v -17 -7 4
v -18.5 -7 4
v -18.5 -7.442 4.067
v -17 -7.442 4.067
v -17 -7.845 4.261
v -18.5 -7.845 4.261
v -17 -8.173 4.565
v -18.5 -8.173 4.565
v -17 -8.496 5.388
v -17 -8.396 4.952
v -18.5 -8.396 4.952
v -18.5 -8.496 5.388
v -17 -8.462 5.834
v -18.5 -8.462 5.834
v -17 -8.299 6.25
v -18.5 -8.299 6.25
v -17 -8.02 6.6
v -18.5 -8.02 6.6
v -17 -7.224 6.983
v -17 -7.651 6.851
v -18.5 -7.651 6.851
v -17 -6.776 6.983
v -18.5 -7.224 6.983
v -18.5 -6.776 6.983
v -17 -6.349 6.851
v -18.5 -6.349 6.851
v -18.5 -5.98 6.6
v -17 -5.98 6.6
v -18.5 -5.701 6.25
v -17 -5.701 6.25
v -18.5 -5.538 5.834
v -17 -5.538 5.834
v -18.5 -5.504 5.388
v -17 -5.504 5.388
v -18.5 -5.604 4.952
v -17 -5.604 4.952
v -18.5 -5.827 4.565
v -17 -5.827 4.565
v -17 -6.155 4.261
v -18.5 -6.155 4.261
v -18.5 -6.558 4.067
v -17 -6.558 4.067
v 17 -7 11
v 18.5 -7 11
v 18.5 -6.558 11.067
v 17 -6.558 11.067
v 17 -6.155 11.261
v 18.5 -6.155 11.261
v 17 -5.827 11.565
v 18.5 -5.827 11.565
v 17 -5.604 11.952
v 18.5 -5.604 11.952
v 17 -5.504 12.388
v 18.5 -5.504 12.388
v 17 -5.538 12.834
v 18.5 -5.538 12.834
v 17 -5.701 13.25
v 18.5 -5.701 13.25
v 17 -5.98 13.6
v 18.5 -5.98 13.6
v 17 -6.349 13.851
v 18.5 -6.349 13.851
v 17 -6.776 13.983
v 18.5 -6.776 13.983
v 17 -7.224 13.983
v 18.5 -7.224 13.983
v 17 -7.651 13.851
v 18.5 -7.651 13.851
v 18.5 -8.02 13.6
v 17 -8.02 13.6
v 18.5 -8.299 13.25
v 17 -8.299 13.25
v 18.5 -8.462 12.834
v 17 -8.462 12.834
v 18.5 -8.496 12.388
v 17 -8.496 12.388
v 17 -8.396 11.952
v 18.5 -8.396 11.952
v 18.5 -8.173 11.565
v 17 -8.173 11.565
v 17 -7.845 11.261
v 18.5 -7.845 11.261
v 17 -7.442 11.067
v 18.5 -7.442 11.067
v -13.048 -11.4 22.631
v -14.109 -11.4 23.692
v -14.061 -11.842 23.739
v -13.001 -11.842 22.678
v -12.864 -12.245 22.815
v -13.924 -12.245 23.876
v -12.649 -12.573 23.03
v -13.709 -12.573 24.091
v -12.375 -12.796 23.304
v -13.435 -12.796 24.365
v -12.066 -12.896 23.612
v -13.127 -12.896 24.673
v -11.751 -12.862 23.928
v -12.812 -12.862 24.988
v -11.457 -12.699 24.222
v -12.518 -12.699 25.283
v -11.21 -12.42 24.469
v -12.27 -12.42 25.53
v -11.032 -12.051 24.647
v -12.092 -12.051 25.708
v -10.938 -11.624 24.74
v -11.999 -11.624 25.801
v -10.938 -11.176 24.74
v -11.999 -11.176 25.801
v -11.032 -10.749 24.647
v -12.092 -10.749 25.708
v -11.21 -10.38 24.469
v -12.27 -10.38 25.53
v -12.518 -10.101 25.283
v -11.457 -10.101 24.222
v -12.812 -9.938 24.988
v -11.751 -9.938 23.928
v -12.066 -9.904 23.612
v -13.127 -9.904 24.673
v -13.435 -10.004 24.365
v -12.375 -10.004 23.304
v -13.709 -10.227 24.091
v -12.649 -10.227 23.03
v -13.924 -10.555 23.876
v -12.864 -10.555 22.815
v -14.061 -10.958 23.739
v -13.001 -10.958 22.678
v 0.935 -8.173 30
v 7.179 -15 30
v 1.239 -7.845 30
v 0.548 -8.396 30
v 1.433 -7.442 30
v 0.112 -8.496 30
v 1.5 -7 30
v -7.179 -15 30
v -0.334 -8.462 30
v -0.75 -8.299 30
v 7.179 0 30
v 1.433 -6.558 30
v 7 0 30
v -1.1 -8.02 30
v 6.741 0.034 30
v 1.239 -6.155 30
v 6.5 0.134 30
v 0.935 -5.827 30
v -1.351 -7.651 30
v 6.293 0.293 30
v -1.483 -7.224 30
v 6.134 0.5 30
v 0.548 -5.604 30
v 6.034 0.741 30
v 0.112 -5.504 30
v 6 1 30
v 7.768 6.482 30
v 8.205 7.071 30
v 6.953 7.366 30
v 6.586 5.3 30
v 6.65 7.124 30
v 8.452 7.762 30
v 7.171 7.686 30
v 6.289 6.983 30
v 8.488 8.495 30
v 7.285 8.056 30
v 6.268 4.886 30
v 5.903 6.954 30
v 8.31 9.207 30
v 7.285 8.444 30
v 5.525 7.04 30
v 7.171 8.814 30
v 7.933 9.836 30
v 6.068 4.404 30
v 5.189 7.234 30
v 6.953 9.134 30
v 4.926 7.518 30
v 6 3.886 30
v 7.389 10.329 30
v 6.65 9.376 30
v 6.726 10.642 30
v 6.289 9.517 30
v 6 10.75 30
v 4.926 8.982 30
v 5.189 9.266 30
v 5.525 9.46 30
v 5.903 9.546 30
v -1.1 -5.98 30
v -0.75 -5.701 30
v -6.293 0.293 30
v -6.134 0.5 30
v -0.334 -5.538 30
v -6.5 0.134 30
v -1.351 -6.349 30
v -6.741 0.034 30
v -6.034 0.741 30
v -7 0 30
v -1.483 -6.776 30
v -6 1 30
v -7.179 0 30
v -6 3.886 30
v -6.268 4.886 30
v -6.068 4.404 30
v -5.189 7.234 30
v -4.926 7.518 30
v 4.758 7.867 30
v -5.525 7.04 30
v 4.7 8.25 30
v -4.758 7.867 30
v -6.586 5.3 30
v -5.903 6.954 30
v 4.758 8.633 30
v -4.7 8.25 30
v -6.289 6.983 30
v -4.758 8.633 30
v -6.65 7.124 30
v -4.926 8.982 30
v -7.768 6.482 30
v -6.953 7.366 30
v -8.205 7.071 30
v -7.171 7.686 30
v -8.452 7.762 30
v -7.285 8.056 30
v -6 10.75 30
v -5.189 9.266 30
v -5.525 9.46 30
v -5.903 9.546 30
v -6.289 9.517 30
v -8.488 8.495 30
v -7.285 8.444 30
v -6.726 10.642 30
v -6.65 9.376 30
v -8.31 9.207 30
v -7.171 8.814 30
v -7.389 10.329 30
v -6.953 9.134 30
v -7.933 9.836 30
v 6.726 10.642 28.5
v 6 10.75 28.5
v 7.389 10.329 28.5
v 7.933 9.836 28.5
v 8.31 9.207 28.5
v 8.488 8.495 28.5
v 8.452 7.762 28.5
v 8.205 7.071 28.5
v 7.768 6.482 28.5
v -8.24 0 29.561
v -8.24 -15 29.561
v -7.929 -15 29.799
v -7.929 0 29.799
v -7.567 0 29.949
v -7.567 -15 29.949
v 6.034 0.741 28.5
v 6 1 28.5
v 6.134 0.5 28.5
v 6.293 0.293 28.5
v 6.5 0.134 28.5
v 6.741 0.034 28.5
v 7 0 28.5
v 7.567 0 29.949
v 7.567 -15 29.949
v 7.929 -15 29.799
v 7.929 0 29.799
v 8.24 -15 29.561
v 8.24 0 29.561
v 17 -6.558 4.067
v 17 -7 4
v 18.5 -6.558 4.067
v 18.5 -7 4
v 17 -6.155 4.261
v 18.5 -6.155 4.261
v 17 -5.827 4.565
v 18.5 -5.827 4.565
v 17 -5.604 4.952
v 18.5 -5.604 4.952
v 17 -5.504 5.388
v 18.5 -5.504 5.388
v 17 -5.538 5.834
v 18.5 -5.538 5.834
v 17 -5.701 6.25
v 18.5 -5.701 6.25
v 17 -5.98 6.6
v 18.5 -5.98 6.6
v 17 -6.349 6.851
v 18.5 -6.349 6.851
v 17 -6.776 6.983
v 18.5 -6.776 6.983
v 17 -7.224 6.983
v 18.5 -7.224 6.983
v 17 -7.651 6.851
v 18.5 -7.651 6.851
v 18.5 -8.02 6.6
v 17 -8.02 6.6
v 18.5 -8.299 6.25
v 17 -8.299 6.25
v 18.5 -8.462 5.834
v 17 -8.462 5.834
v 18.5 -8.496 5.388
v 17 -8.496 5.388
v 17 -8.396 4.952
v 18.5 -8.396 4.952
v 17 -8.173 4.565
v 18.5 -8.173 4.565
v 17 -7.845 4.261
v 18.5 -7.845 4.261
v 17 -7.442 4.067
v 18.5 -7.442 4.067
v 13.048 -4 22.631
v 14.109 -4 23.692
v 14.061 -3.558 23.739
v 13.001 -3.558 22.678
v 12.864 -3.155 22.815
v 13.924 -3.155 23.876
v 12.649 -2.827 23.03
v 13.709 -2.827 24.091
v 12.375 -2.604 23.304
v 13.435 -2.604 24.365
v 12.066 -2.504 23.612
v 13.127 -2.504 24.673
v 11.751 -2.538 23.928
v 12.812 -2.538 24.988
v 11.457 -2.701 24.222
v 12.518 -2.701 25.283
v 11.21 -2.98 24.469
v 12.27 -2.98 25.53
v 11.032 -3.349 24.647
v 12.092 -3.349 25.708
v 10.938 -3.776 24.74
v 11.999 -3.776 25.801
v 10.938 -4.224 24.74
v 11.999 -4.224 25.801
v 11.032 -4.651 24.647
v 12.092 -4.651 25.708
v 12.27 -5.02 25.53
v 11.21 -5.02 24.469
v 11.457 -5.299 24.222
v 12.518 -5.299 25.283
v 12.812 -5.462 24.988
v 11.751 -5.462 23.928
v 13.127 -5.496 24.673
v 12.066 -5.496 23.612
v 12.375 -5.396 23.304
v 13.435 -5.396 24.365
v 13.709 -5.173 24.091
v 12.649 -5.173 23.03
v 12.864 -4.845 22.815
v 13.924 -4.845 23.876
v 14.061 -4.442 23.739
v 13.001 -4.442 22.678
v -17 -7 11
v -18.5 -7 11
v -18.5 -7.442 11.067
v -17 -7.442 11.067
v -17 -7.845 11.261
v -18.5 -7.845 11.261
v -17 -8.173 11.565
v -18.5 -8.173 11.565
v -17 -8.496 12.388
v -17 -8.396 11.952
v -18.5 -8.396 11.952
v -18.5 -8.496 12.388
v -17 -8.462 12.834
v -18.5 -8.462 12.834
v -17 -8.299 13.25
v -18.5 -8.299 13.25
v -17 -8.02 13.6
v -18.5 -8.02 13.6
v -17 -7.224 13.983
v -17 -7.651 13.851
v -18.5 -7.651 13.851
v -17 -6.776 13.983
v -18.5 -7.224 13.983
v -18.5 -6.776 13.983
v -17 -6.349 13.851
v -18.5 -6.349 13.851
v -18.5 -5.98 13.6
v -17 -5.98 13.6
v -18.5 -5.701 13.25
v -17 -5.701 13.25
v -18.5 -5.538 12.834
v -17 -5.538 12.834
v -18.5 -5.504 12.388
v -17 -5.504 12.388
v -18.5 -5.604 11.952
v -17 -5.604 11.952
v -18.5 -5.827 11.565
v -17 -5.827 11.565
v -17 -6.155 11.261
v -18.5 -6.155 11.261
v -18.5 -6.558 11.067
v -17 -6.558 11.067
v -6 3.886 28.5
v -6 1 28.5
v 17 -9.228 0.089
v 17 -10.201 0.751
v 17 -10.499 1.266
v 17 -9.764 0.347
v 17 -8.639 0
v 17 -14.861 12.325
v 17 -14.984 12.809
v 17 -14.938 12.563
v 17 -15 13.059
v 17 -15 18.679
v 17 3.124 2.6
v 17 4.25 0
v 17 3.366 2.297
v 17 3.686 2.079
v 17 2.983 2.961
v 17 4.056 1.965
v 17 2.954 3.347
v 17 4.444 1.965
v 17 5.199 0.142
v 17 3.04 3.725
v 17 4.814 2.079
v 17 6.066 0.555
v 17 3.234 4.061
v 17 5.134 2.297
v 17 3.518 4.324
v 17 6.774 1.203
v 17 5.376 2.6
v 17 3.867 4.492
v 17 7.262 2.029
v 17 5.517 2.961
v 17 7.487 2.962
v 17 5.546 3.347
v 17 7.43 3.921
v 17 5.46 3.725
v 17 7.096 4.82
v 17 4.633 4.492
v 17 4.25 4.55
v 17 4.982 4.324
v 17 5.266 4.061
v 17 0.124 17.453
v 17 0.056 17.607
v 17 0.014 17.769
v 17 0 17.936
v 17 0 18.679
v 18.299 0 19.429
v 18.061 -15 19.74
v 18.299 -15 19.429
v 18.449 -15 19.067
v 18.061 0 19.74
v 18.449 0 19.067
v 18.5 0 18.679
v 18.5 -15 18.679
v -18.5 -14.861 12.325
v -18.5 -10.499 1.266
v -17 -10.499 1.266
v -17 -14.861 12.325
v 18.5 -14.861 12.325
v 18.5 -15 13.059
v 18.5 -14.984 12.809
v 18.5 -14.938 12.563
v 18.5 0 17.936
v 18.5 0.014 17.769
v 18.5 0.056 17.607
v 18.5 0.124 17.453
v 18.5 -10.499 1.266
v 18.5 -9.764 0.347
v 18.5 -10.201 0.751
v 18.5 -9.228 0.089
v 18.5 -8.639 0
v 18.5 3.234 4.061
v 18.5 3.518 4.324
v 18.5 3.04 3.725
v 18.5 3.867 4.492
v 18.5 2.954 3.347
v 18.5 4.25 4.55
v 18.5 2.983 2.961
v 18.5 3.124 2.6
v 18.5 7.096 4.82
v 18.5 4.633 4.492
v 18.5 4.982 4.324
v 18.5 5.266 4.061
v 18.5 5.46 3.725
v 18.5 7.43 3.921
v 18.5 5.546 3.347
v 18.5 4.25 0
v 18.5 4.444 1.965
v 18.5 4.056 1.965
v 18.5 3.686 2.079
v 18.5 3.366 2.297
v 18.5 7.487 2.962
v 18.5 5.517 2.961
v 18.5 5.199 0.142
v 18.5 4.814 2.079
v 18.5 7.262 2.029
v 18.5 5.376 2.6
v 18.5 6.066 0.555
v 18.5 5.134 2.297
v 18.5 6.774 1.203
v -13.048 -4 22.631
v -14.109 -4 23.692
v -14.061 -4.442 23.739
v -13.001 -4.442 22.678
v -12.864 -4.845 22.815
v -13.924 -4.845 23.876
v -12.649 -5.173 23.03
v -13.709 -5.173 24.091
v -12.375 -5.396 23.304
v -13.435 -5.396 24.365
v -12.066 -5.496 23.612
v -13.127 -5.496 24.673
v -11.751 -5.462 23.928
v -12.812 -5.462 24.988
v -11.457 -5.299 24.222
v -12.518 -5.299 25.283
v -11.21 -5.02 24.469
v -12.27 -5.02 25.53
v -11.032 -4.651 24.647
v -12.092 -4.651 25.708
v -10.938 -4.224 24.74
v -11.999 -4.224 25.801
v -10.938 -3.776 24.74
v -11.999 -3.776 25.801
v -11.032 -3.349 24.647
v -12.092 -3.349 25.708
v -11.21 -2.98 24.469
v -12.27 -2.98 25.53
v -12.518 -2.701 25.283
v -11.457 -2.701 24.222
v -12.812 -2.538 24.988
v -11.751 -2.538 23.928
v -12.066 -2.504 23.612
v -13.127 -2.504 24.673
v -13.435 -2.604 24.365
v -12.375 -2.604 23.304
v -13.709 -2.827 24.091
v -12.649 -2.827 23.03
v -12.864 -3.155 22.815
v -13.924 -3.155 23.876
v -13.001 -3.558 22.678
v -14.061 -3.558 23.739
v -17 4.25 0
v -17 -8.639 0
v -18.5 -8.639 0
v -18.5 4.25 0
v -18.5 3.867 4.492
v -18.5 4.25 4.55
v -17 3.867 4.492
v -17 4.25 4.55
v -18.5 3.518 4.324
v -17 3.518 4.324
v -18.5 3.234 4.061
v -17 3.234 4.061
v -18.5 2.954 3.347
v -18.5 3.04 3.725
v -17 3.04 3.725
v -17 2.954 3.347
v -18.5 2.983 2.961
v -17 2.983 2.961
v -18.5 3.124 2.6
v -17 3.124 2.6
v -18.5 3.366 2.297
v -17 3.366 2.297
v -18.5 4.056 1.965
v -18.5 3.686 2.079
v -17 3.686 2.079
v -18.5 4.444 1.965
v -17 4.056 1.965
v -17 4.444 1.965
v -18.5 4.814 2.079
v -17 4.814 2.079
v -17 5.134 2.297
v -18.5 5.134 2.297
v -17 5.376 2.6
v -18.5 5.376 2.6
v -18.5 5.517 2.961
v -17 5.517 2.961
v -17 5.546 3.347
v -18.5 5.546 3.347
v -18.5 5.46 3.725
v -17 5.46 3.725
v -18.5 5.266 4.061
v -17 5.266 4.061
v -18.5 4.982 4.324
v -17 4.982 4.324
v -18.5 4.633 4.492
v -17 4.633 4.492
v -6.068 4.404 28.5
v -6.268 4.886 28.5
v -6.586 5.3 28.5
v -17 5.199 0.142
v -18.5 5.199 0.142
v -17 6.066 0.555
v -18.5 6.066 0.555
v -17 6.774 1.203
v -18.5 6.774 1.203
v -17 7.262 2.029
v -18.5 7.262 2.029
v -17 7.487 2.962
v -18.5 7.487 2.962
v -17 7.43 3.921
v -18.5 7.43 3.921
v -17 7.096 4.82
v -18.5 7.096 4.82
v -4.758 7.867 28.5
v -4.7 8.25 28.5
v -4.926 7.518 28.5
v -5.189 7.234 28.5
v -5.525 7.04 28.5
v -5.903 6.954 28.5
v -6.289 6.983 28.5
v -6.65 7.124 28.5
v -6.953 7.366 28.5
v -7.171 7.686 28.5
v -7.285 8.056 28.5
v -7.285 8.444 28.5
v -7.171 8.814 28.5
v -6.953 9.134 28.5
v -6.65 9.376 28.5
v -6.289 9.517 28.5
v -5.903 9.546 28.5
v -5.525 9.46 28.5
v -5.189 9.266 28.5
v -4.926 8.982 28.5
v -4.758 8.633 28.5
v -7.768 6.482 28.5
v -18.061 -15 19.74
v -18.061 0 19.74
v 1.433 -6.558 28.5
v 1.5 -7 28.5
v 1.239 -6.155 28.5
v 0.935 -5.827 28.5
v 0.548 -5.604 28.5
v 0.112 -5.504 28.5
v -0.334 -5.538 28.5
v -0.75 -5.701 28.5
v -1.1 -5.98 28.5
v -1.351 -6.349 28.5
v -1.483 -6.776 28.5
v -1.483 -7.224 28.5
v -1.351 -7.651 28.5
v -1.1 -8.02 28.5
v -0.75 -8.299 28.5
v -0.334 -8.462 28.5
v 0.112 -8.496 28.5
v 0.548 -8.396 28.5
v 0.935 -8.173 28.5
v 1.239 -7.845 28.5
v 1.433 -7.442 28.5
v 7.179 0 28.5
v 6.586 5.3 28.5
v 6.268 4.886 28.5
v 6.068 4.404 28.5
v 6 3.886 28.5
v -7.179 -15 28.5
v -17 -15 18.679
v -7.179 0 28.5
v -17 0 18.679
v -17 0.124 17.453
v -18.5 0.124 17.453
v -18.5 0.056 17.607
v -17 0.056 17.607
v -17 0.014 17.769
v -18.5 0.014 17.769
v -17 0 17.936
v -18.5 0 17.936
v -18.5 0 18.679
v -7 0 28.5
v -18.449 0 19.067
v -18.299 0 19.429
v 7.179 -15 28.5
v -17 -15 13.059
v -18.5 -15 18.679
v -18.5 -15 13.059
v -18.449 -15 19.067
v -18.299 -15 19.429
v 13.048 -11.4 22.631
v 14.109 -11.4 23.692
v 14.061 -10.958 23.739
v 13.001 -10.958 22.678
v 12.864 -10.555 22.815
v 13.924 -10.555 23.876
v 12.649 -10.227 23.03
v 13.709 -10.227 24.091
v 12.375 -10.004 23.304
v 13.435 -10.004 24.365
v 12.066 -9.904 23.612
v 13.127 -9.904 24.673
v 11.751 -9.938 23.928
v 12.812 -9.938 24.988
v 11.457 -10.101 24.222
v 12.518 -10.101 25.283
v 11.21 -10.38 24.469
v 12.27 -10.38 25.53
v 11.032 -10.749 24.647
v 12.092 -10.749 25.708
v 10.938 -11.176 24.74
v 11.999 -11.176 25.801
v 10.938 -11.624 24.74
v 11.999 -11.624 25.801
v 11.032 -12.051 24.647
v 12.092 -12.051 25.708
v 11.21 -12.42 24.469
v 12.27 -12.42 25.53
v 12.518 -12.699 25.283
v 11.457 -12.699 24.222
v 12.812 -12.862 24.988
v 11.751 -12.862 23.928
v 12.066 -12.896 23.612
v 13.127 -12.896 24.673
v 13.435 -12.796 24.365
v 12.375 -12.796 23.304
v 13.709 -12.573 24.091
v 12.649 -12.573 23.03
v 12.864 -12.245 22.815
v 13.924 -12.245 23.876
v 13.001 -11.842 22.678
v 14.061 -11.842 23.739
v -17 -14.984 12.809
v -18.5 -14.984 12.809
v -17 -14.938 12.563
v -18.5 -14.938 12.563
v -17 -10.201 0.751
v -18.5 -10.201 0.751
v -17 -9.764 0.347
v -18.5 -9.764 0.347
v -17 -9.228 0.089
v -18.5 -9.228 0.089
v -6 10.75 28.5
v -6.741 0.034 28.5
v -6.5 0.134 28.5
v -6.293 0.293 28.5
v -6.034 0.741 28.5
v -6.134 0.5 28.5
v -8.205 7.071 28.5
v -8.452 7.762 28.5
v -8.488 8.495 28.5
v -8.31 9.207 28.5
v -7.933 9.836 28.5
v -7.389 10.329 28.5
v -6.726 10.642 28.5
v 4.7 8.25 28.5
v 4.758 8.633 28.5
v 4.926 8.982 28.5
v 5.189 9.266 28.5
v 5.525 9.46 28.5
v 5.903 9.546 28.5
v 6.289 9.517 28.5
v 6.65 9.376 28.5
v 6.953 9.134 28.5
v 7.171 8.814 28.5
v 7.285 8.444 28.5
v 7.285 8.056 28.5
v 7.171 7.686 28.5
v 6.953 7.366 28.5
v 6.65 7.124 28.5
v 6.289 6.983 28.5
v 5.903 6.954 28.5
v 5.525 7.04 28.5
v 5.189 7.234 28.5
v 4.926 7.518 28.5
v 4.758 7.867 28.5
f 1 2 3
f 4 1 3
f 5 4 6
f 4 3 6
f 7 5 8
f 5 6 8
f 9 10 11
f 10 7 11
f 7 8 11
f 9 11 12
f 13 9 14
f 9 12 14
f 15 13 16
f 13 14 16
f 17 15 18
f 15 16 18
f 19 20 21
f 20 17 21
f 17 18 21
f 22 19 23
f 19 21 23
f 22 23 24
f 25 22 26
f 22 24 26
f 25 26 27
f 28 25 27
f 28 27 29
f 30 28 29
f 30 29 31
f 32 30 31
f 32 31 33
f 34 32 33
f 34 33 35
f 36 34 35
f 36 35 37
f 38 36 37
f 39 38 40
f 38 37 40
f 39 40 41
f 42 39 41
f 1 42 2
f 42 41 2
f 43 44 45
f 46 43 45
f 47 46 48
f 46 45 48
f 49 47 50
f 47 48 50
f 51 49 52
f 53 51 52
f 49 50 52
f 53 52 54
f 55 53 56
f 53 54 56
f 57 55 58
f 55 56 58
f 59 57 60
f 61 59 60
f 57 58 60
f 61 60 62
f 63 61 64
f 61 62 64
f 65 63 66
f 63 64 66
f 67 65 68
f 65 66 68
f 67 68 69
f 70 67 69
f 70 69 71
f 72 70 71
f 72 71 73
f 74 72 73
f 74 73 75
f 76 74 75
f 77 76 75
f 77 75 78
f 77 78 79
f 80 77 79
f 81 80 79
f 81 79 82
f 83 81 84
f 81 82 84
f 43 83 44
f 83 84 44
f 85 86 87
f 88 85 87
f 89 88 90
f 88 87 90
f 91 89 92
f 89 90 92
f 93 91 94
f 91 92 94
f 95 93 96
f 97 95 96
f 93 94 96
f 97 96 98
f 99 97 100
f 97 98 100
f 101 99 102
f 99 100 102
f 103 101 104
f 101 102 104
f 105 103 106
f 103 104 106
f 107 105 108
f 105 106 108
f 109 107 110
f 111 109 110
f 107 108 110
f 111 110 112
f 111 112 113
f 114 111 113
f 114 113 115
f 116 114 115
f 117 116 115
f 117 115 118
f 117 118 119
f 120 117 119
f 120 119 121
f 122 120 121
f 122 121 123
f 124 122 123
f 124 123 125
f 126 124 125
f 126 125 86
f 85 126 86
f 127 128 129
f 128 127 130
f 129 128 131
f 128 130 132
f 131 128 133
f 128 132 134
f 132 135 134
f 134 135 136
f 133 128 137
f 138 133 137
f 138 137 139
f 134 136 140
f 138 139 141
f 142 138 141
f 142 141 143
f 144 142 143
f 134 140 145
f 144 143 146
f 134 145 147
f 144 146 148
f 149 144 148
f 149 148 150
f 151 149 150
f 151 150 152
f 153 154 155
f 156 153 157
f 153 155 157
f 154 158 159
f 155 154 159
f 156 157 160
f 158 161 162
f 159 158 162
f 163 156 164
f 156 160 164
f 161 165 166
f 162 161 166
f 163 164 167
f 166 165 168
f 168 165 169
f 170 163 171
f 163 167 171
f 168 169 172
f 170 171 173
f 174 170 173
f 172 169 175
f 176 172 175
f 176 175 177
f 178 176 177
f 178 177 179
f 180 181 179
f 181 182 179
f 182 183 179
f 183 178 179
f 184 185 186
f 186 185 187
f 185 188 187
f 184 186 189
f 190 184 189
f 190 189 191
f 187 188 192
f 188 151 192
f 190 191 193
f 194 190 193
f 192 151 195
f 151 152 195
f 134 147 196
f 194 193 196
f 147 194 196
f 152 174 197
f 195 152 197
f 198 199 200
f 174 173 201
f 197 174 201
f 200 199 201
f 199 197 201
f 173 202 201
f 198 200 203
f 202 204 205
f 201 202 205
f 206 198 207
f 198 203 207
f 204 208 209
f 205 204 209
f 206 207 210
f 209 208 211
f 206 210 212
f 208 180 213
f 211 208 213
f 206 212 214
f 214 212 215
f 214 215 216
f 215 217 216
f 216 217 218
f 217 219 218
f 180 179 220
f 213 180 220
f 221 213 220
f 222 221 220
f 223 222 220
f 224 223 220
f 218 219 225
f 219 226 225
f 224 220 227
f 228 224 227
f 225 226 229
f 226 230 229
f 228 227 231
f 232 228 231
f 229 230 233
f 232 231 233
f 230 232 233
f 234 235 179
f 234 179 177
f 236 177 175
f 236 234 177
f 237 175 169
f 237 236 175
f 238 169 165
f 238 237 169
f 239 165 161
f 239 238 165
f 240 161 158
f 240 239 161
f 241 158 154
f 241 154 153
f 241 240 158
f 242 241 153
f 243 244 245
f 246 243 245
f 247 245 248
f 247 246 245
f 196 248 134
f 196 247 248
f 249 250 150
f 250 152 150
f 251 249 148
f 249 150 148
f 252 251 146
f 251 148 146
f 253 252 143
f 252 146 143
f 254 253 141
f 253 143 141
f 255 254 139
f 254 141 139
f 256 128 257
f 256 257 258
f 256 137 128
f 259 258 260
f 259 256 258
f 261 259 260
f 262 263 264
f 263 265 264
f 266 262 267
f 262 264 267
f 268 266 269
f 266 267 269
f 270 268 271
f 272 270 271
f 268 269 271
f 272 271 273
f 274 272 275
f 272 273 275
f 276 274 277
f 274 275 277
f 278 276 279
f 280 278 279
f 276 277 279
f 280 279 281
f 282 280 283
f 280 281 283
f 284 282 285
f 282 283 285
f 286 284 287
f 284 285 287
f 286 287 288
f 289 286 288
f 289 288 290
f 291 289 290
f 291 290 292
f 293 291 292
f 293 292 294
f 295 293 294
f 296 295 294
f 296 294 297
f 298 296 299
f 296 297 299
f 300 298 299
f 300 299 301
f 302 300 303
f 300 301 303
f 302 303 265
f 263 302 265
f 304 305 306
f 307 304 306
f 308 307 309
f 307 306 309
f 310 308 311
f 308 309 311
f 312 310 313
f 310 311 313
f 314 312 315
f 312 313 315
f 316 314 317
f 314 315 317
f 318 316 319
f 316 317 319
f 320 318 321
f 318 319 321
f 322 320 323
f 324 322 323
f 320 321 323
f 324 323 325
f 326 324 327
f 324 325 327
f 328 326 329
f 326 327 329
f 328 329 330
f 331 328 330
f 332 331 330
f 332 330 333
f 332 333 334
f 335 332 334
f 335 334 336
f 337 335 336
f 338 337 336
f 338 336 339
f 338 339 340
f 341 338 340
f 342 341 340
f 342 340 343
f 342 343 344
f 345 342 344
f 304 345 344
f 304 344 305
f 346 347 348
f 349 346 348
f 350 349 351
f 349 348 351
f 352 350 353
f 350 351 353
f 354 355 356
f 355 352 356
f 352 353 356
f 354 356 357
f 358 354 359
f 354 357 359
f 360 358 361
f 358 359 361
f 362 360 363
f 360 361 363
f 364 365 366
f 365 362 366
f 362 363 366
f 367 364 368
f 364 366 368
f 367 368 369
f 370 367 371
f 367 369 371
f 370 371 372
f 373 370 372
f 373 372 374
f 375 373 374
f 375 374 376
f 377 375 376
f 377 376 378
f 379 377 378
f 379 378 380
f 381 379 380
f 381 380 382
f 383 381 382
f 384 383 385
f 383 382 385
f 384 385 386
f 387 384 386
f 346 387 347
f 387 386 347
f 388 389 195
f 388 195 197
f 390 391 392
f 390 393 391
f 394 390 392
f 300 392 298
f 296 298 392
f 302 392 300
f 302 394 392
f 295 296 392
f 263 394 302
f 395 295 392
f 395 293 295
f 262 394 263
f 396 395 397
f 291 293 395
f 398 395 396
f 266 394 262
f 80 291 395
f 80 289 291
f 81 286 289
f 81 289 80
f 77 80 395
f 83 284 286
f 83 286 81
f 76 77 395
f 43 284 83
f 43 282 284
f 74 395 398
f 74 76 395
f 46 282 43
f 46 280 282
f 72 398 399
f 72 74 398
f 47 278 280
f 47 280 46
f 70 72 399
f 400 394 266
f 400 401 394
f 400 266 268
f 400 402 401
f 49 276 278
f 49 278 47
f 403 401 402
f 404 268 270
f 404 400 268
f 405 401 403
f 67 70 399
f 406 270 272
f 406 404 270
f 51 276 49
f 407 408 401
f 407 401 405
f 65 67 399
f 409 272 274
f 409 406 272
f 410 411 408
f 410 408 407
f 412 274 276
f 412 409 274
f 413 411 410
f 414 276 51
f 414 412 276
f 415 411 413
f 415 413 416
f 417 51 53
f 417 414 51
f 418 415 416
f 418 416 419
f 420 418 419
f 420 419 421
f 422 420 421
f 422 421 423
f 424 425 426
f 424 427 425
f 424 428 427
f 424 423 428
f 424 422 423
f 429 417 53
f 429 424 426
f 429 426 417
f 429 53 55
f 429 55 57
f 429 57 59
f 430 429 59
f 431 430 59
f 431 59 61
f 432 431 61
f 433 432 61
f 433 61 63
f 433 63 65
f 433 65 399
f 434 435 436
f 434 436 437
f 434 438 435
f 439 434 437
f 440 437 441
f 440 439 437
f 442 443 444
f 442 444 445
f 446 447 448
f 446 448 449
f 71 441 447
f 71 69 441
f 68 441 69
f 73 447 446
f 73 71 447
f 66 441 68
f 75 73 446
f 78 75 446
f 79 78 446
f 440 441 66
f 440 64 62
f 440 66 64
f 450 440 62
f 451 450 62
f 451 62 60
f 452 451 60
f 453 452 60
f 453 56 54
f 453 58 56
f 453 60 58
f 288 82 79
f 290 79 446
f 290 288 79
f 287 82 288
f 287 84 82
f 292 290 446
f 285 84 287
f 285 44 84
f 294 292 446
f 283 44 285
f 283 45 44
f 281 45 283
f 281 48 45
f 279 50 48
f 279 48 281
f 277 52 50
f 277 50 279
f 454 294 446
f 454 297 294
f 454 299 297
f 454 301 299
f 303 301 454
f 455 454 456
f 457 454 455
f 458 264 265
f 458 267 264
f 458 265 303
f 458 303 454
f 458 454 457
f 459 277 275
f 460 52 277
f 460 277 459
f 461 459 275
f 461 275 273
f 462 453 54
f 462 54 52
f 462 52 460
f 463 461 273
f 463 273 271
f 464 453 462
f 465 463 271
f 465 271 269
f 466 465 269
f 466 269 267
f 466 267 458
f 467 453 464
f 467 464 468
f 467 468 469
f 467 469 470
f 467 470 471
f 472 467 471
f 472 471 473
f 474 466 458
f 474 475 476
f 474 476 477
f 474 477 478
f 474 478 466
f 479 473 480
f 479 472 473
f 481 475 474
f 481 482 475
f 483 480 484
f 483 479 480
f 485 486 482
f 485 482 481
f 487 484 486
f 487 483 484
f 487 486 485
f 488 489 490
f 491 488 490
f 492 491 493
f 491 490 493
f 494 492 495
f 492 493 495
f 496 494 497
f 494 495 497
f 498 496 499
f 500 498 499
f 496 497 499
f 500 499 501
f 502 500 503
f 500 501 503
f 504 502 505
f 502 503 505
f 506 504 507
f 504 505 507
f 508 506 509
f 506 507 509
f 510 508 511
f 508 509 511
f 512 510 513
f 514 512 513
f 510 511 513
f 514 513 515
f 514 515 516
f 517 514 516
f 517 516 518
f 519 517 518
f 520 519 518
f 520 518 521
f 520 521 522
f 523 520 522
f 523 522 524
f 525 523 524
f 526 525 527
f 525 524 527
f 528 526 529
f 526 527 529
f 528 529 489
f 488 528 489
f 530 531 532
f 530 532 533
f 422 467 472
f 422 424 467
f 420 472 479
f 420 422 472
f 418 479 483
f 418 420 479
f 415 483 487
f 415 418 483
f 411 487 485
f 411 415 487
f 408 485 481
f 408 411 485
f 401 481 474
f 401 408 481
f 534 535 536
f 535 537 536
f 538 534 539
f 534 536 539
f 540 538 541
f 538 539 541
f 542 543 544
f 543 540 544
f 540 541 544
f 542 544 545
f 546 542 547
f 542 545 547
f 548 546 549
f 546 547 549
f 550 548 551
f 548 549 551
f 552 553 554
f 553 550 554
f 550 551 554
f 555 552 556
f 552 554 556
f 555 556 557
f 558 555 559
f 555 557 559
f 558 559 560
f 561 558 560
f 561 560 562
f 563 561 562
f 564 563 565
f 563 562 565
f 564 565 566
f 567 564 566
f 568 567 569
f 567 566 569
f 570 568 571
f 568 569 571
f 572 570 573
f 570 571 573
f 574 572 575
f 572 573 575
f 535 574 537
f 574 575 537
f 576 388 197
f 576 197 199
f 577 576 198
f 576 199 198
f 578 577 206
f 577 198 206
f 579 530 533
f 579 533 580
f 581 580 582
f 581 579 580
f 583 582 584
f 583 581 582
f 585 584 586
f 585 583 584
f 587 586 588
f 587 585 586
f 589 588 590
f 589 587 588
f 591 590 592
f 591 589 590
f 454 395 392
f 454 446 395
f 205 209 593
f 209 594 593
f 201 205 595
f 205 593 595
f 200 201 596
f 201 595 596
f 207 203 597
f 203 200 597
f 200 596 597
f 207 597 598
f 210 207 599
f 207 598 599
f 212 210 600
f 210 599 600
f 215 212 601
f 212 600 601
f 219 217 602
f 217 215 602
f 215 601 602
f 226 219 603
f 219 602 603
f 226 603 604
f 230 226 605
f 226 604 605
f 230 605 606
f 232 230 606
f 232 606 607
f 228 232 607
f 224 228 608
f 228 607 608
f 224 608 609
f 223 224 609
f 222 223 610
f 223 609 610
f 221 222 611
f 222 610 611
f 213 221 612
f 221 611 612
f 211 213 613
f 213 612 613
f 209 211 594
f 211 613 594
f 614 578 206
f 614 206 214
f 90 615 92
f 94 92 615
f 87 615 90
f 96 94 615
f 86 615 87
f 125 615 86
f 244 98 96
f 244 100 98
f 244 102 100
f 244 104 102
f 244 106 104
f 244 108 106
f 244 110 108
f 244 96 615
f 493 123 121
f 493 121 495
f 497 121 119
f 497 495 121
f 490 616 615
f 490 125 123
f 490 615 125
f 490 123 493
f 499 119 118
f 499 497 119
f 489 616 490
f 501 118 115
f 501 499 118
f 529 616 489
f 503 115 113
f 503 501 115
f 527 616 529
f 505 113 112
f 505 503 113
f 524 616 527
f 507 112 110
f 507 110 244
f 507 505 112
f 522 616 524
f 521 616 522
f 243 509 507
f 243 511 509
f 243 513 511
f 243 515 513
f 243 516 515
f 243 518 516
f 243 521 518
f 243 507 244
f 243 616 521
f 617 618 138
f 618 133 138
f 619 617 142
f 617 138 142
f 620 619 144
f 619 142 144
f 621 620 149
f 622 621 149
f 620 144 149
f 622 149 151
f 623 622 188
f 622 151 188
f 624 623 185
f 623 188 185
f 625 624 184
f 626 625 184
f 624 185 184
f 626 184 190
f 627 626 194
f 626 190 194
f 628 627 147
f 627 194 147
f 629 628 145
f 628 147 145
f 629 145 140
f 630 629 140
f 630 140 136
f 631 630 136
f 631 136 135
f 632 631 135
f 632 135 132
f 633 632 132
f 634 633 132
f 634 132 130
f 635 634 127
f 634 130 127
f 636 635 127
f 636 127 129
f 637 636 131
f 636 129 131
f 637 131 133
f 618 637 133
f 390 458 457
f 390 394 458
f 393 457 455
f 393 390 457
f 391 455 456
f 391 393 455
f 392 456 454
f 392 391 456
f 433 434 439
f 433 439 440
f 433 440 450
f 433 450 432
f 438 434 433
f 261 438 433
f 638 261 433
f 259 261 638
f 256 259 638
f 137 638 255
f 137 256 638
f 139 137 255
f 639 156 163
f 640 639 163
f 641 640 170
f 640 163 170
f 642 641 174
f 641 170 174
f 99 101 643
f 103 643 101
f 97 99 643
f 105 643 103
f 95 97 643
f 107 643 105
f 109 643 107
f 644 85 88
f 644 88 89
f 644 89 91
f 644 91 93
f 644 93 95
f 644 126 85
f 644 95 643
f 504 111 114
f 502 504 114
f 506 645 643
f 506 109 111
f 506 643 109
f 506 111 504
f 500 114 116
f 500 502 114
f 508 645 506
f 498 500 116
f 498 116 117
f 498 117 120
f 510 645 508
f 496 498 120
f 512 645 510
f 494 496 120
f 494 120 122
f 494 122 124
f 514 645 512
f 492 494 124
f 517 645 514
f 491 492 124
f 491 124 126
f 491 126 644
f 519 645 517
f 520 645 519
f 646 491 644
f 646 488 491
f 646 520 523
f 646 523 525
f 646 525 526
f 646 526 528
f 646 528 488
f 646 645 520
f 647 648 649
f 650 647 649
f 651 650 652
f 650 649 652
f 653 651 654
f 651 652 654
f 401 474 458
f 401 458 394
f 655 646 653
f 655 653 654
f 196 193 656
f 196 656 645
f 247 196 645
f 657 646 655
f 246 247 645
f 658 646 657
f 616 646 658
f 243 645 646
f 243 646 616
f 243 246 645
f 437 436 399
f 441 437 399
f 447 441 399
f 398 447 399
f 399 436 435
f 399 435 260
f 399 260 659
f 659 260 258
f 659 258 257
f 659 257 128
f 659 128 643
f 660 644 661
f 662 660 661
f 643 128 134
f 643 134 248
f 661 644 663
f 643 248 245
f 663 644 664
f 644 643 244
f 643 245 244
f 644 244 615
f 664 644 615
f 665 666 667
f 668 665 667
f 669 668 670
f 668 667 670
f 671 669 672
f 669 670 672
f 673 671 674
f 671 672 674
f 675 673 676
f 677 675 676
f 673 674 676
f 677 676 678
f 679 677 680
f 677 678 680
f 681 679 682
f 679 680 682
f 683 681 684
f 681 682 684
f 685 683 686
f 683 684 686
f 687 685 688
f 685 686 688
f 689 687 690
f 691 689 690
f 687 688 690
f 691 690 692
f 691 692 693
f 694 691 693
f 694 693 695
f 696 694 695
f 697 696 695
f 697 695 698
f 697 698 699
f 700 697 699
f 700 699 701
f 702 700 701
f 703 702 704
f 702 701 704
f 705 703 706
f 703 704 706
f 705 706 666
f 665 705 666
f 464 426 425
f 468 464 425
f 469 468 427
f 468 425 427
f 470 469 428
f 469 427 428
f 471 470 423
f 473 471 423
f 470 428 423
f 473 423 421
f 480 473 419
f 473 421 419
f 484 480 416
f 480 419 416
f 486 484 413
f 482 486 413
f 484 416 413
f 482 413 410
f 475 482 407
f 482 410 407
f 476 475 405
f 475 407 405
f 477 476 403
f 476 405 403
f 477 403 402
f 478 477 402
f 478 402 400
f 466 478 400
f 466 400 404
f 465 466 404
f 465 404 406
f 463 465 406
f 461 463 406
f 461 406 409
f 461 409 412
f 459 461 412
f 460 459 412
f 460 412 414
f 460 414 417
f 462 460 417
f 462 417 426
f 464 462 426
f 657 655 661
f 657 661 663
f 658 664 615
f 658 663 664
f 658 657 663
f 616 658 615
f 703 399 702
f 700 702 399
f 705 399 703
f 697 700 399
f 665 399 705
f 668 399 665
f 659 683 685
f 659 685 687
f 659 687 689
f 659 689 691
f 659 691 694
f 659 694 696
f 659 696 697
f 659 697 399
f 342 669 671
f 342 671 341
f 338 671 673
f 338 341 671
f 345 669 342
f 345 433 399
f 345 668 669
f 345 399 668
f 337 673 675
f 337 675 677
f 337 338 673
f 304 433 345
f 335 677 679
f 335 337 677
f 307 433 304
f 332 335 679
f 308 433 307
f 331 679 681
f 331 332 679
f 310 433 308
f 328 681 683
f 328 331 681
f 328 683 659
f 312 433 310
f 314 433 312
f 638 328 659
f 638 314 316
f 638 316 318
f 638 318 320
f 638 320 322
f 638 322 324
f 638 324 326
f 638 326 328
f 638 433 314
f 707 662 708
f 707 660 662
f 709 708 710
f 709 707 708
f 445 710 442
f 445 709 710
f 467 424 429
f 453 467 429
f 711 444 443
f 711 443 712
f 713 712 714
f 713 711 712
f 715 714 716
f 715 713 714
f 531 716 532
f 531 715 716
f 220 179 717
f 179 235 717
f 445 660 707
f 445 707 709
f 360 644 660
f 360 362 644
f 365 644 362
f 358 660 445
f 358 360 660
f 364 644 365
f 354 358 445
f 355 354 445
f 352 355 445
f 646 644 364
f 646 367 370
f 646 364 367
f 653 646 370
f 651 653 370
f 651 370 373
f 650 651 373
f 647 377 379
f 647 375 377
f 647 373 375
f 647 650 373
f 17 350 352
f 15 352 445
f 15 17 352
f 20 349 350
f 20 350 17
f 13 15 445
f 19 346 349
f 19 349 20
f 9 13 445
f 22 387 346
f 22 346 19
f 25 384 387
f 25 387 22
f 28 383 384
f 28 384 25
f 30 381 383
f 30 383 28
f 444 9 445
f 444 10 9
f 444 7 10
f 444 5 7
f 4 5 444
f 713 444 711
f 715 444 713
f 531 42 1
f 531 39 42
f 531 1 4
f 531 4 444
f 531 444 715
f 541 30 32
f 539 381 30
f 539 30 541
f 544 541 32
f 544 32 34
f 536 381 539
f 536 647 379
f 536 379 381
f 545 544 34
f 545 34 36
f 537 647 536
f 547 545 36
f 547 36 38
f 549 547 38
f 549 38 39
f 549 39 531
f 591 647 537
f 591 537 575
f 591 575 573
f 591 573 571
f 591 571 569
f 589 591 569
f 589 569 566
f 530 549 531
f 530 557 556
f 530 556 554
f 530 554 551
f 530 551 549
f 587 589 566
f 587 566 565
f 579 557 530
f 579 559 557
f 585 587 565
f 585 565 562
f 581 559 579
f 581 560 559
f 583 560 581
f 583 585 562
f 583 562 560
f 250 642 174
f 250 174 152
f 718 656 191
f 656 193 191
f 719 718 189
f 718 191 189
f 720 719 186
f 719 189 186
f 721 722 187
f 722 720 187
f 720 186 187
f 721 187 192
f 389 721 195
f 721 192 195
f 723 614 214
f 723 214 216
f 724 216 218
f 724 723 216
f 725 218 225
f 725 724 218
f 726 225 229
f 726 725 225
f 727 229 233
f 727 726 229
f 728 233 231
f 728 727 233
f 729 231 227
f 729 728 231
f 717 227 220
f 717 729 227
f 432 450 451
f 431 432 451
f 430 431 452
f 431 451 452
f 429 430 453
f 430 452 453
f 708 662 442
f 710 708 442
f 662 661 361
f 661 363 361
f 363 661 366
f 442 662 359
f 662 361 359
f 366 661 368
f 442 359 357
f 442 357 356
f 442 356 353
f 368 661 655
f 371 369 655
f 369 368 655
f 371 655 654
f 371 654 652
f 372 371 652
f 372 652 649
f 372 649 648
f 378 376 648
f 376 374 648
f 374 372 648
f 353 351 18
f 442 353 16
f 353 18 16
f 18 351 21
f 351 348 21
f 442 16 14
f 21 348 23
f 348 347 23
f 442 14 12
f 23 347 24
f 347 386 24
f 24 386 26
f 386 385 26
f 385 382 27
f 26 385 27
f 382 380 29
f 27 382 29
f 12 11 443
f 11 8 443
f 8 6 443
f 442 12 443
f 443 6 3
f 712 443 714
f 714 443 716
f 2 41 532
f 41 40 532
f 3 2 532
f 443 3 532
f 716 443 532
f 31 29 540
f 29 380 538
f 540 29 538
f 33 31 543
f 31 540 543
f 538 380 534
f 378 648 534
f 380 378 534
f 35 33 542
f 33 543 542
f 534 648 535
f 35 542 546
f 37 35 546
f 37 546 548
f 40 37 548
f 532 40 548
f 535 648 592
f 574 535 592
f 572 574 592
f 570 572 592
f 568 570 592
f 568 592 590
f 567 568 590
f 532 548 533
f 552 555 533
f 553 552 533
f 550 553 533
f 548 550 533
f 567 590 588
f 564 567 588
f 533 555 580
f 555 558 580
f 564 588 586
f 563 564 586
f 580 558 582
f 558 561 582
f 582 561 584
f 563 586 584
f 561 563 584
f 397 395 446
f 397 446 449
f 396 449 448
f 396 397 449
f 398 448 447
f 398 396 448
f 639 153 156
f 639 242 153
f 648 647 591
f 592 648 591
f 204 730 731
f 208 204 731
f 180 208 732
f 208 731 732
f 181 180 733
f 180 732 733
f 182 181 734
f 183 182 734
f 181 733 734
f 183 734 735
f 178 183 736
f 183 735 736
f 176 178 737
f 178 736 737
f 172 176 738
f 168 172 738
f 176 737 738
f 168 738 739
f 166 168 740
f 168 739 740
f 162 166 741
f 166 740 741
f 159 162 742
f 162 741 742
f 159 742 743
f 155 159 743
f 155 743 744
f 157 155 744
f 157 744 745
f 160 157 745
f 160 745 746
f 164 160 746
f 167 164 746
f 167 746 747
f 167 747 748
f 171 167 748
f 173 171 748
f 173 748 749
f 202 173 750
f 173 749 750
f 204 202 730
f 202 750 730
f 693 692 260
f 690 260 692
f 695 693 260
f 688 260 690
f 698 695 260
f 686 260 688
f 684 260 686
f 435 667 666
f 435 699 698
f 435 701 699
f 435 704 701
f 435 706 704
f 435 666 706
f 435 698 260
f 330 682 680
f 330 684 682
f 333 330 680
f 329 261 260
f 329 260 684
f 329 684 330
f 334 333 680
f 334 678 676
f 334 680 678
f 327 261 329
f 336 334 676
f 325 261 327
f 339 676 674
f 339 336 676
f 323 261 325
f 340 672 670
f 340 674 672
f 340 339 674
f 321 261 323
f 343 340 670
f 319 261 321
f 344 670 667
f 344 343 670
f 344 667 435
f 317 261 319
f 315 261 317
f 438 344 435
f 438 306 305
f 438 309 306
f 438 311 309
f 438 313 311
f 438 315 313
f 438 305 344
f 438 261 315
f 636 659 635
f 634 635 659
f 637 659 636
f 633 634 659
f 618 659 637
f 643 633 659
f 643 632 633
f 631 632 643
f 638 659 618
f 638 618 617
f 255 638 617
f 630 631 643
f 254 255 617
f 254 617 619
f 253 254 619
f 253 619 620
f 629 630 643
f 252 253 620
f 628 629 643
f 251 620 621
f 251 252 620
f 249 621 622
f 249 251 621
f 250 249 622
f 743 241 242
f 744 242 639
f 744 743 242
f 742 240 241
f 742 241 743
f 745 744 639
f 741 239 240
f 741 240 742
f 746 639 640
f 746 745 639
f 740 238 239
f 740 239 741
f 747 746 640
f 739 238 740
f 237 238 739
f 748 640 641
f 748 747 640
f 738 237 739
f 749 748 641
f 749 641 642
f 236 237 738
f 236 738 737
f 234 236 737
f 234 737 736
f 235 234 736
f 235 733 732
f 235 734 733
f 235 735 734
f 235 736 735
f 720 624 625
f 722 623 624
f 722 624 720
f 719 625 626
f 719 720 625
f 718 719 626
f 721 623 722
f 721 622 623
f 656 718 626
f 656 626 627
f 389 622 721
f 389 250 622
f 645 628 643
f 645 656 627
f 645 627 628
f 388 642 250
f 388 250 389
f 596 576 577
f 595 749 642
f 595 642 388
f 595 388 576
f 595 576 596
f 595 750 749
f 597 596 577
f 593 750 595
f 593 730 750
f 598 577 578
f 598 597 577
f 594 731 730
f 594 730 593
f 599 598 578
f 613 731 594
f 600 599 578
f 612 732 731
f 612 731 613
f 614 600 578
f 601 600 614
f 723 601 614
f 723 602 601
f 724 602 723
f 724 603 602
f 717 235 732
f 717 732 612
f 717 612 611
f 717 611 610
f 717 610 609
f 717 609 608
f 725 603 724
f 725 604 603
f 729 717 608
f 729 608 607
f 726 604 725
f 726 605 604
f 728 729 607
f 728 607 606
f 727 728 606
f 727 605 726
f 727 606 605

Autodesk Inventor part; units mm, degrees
ref_plane "YZ Plane" through (0, 0, 0) normal (1, 0, 0) x (0, 1, 0)
ref_plane "XZ Plane" through (0, 0, 0) normal (0, 1, 0) x (-1, 0, 0)
ref_plane "XY Plane" through (0, 0, 0) normal (0, 0, 1) x (1, 0, 0)
sketch "スケッチ1" plane through (0, 0, 0) normal (0, 1, 0) x (-1, 0, 0)
  line L0 (0, 0) -> (0, 28.5) construction
  line L1 (0, 30) -> (-7.1789, 30)
  line L2 (-8.2396, 29.5607) -> (-18.0607, 19.7396)
  line L3 (-18.5, 18.6789) -> (-18.5, 0)
  line L4 (-18.5, 0) -> (-17, 0)
  line L5 (-17, 0) -> (-17, 18.6789)
  line L6 (-17, 18.6789) -> (-7.1789, 28.5)
  line L7 (-7.1789, 28.5) -> (0, 28.5)
  line L8 (0, 28.5) -> (0, 30)
  line L9 (0, 0) -> (-17, 0) construction
  line L10 (0, 14.25) -> (-10.7145, 24.9645) construction
  arc A0 (-7.1789, 30) -> (-8.2396, 29.5607) centre (-7.1789, 28.5) ccw
  arc A1 (-18.0607, 19.7396) -> (-18.5, 18.6789) centre (-17, 18.6789) ccw
  dimension "d0" = 28.5
  dimension "d1" = 1.5
  dimension "d2" = 1.5
  dimension "d3" = 135
  dimension "d4" = 1.5
  dimension "d5" = 34
  dimension "d7" = 5
  dimension "d8" = 1.5
extrude "押し出し1" add sketch "スケッチ1" against normal blind 15
sketch "スケッチ2" plane through (17, 0, 0) normal (-1, 0, 0) x (0, 0, 1)
  circle A0 centre (3.25, 4.25) radius 1.3
  arc A1 (4.8202, 7.0955) -> (0, 4.25) centre (3.25, 4.25) ccw
  line L0 (0, 4.25) -> (0, 0)
  line L1 (4.8202, 7.0955) -> (17.6789, 0)
  line L2 (18.6789, 0) -> (0, 0) construction
  line L3 (0, 0) -> (0, -15) construction
  line L4 (0, 0) -> (17.6789, 0)
  line L5 (18.6789, 0) -> (18.6789, -15) projected
  dimension "d11" = 2.6
  dimension "d12" = 4.25
  dimension "d13" = 3.25
  dimension "d14" = 1
extrude "押し出し2" add sketch "スケッチ2" against normal blind 1.5
sketch "スケッチ3" plane through (7.1789, 0, 28.5) normal (0, 0, -1) x (-1, 0, 0)
  circle A0 centre (1.1789, 8.25) radius 1.3
  line L0 (7.1789, 0) -> (0, 0) construction
  line L1 (7.1789, 0) -> (7.1789, 5.7754) construction
  arc A1 (1.1789, 10.75) -> (-0.5888, 6.4822) centre (1.1789, 8.25) ccw
  line L2 (-0.5888, 6.4822) -> (1.1789, 4.7145)
  line L3 (1.1789, 4.7145) -> (1.1789, 0)
  line L4 (1.1789, 10.75) -> (7.1789, 10.75)
  line L5 (7.1789, 10.75) -> (7.1789, 0)
  line L6 (1.1789, 0) -> (7.1789, 0)
  dimension "d17" = 8.25
  dimension "d18" = 12
  dimension "d19" = 2.6
  dimension "d20" = 2.5
  dimension "d21" = 45
  dimension "d22" = 12
extrude "押し出し3" add sketch "スケッチ3" against normal blind 1.5
sketch "スケッチ4" plane through (18.5, -15, 18.6789) normal (1, 0, 0) x (0, 0, -1)
  line L0 (6, 0) -> (18.6789, 5)
  line L1 (18.6789, 0) -> (18.6789, 19.25) construction
  line L2 (18.6789, 0) -> (18.6789, 5)
  line L3 (0, 0) -> (18.6789, 0) construction
  line L4 (18.6789, 0) -> (6, 0)
  line L5 (0, 15) -> (0, 0) construction
  circle A0 centre (13.1789, 8) radius 1.5
  circle A1 centre (6.1789, 8) radius 1.5
  arc A2 (14.2789, 7.4063) -> (14.2789, 8.5937) centre (13.1789, 8) ccw projected
  arc A3 (7.2789, 7.4063) -> (7.2789, 8.5937) centre (6.1789, 8) ccw projected
  dimension "d25" = 5
  dimension "d26" = 6
  dimension "d36" = 3
extrude "押し出し4" cut sketch "スケッチ4" against normal blind 1.5
fillet "フィレット1" radius 2 3 edges at (17.75, -10, 0) (17.75, -15, 12.6789) (6, 4.7145, 29.25)
fillet "フィレット2" radius 1 2 edges at (17.75, 0, 17.6789) (6, 0, 29.25)
sketch "スケッチ5" plane through (8.2396, -15, 29.5607) normal (0.7071, 0, 0.7071) x (0.7071, 0, -0.7071)
  circle A0 centre (6.8, 11) radius 1.5
  circle A1 centre (6.8, 3.6) radius 1.5
  line L0 (0, 15) -> (13.8891, 15) projected
  line L1 (6.8, 90.0103) -> (6.8, -102.5616) construction
  point P0 (15.0763, 15)
  dimension "d31" = 7.4
  dimension "d32" = 3
  dimension "d33" = 4
extrude "押し出し5" cut sketch "スケッチ5" against normal blind 1.5
mirror "ミラー3" about plane through (0, 0, 0) normal (1, 0, 0) of "押し出し1", "押し出し2", "押し出し3", "押し出し4", "フィレット1", "フィレット2", "押し出し5"
sketch "スケッチ7" plane through (7.1789, -15, 30) normal (0, 0, 1) x (1, 0, 0)
  circle A0 centre (-7.1789, 8) radius 1.5
  arc A1 (-7.8848, 9.0316) -> (-7.8848, 6.9684) centre (-7.1789, 8) ccw projected
  point P0 (-7.1789, 15)
  dimension "d37" = 3
extrude "押し出し6" cut sketch "スケッチ7" against normal blind 1.5
properties part number "16_024_LOAD_CELL_MOUNT_BRACKET_R1" material "アルミニウム 6061"
